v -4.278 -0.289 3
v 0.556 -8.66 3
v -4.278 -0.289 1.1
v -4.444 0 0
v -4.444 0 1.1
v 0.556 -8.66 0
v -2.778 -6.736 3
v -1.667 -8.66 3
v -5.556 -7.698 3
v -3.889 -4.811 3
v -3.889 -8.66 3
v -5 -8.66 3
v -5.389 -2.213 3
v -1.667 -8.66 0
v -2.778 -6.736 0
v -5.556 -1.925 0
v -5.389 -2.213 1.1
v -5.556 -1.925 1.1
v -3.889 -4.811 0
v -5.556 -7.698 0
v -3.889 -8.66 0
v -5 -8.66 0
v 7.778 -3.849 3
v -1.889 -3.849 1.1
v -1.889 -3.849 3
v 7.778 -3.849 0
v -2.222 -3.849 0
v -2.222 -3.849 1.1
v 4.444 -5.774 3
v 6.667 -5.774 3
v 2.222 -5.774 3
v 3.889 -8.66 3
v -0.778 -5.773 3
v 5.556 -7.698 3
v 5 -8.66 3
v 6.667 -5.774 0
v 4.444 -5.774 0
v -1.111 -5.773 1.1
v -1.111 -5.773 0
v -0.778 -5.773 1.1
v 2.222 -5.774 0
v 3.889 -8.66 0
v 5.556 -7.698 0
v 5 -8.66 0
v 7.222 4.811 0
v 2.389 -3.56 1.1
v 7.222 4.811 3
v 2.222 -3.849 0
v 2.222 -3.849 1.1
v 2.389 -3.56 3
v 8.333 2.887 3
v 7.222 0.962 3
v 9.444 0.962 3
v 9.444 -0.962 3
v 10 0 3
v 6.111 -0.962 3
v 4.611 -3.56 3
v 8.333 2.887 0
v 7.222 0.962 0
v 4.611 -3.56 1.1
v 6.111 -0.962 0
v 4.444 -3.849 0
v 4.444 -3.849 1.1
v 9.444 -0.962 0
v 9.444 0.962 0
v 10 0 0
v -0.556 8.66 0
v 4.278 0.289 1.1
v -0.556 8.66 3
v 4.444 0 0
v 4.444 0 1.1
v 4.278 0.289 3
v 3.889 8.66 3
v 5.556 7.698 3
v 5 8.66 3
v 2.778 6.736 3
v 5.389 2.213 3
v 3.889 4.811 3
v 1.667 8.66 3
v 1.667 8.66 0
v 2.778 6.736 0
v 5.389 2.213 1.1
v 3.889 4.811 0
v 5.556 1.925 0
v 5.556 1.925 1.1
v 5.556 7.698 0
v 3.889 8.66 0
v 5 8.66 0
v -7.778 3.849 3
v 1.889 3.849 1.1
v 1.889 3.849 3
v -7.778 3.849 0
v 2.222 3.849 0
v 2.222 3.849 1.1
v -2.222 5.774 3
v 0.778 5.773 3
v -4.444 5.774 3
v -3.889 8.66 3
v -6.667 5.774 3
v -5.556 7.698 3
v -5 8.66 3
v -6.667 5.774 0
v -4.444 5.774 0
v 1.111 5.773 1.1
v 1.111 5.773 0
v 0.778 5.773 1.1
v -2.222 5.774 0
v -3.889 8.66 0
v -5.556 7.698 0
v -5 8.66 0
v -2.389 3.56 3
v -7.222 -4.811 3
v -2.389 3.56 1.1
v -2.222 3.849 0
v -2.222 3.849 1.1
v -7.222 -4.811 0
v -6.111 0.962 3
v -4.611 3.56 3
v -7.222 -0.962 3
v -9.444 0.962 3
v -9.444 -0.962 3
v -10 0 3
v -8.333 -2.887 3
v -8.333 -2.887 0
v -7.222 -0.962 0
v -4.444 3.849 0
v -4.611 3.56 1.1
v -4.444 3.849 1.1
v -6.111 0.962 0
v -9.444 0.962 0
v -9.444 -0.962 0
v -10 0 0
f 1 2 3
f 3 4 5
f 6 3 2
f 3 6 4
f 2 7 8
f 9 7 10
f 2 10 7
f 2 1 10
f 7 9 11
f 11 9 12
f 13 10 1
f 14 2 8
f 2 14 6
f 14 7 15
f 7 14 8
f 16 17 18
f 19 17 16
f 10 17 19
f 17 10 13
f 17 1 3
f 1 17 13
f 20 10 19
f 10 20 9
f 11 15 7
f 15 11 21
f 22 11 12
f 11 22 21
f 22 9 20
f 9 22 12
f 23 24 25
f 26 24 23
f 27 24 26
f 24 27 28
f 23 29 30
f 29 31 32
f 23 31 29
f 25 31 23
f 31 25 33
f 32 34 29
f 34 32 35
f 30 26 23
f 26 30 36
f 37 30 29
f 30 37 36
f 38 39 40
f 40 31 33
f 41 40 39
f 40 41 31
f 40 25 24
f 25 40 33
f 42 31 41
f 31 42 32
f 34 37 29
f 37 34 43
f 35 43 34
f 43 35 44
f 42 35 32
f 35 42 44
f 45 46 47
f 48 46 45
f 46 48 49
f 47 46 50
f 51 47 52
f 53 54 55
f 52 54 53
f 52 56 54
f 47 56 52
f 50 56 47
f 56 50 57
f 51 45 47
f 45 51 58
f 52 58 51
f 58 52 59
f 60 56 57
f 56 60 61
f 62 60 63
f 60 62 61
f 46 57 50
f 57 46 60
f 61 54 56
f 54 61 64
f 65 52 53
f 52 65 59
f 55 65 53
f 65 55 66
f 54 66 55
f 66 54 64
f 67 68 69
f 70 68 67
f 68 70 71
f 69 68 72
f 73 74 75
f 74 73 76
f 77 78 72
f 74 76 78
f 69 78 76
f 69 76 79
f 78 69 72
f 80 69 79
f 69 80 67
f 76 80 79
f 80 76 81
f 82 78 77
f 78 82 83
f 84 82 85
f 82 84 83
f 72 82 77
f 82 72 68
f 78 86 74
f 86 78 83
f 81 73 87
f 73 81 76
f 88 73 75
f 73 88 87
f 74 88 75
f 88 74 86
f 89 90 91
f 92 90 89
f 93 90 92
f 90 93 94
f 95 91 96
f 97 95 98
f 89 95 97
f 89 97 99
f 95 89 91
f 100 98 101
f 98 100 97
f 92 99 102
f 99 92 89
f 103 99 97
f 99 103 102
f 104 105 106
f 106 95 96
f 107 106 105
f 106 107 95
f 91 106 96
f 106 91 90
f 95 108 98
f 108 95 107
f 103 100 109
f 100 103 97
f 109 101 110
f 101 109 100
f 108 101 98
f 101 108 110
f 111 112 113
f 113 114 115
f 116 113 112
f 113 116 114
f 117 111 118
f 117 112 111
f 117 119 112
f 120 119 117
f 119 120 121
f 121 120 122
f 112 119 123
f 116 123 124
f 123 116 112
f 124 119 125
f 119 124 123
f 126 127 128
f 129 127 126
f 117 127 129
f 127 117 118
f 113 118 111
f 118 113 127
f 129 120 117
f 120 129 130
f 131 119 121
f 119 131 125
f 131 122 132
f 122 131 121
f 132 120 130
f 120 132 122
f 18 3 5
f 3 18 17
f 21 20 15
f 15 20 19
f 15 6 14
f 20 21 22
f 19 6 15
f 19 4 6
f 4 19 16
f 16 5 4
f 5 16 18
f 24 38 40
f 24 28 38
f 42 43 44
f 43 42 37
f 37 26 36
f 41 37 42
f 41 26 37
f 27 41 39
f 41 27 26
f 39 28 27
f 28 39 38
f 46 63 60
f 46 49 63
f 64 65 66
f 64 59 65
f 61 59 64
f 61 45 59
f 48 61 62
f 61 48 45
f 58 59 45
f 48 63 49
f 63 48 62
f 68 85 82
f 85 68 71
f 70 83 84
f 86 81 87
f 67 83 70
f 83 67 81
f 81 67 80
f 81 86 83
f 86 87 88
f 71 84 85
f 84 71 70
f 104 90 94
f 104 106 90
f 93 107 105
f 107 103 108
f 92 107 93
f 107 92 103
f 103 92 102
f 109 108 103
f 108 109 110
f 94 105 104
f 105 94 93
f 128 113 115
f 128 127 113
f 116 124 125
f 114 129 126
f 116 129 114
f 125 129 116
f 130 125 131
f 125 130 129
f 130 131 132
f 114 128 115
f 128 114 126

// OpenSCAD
// file: nixos-parametric.scad
unit = [1, 0];
origin = [0, 0];

function rot2d(angle) = [
    [+cos(angle), -sin(angle)],
    [+sin(angle), +cos(angle)]
];

function inner_hex_points(data) = [
    for (angle = [0 : 60 : 300]) 
    dict_get(data, "scale") * rot2d(angle) * unit
];

module inner_hex(data) {
    linear_extrude(dict_get(data, "height"))
    polygon(inner_hex_points(data));
}


function lambda_points(data) =
let (
    lambda0 = [
        inner_hex_points(data)[2]
        + dict_get(data, "thickness") * rot2d(60) * unit,
        inner_hex_points(data)[5]
        + dict_get(data, "thickness") * rot2d(0) * unit,
        inner_hex_points(data)[5]
        + dict_get(data, "thickness") * rot2d(180) * unit,
        inner_hex_points(data)[2]
        + dict_get(data, "thickness") * rot2d(240) * unit,
    ],
    lambda1 = [
        origin
        + dict_get(data, "thickness") * rot2d(60) * unit
        + dict_get(data, "thickness") * rot2d(120) * unit,
        origin
        + dict_get(data, "thickness") * rot2d(60) * unit
        + dict_get(data, "thickness") * rot2d(-60) * unit,
        inner_hex_points(data)[4]
        + dict_get(data, "thickness") * rot2d(0) * unit,
        inner_hex_points(data)[4]
        + dict_get(data, "thickness") * rot2d(180) * unit,
    ]
)
[lambda0, lambda1];

function gap_points(data) = [
    inner_hex_points(data)[2]
    + dict_get(data, "thickness") * rot2d(60) * unit
    + dict_get(data, "gap") * rot2d(90) * unit,
    inner_hex_points(data)[2]
    + dict_get(data, "thickness") * rot2d(60) * unit
    + dict_get(data, "gap") * rot2d(-60) * unit,
    inner_hex_points(data)[2]
    + dict_get(data, "thickness") * rot2d(240) * unit
    + dict_get(data, "gap") * rot2d(-60) * unit,
    inner_hex_points(data)[2]
    + dict_get(data, "thickness") * rot2d(240) * unit
    + dict_get(data, "gap") * rot2d(180) * unit,
];


module lambda(data) {
    union() {
        if (dict_get(data, "gap") == 0) {
            linear_extrude(dict_get(data, "height")) polygon(lambda_points(data)[0]);
        } else
        {
            difference() {
                linear_extrude(dict_get(data, "height")) polygon(lambda_points(data)[0]);
                linear_extrude(4 * dict_get(data, "height"), center=true) polygon(gap_points(data));
            }
        }
        intersection() {
            linear_extrude(dict_get(data, "height")) polygon(lambda_points(data)[1]);
            inner_hex(data);
        }
    }
}

module flake(data) {
    new_data = update_params(data);
    for (idx = [0 : 5]) {
        rotate([0, 0, idx * 60]) 
        translate(-lambda_points(new_data)[0][0])
        translate([-dict_get(new_data, "scale"), 0, 0])
        lambda(new_data);
    }
}

function dict_get(dict, key) =
  dict[search([key], dict)[0]][1];

function update_params(data) = let
    // factor was empirically found. It gives a flake that is circumscribed by the unit circle.
    (factor = 2.25) [
    [ "gap", dict_get(data, "scale") * dict_get(data, "gap") / factor ],
    [ "height", dict_get(data, "height") ],
    [ "scale", dict_get(data, "scale") / factor ],
    [ "thickness", dict_get(data, "scale") * dict_get(data, "thickness") / factor ],
];

params = [
    [ "gap", 0.05 ],
    [ "height", 1 ],
    [ "scale", 10 ],
    [ "thickness", 0.25 ],
];

flake(params);
// main file
use <nixos-parametric.scad>

params_top = [
    [ "gap", 0.075 ],
    [ "height", 2 ],
    [ "scale", 10 ],
    [ "thickness", 0.25 ],
];

params_bottom = [
    [ "gap", 0 ],
    [ "height", 1.1 ],
    [ "scale", 10 ],
    [ "thickness", 0.25 ],
];

union() {
    translate([0, 0, 1]) flake(params_top);
    flake(params_bottom);
}
